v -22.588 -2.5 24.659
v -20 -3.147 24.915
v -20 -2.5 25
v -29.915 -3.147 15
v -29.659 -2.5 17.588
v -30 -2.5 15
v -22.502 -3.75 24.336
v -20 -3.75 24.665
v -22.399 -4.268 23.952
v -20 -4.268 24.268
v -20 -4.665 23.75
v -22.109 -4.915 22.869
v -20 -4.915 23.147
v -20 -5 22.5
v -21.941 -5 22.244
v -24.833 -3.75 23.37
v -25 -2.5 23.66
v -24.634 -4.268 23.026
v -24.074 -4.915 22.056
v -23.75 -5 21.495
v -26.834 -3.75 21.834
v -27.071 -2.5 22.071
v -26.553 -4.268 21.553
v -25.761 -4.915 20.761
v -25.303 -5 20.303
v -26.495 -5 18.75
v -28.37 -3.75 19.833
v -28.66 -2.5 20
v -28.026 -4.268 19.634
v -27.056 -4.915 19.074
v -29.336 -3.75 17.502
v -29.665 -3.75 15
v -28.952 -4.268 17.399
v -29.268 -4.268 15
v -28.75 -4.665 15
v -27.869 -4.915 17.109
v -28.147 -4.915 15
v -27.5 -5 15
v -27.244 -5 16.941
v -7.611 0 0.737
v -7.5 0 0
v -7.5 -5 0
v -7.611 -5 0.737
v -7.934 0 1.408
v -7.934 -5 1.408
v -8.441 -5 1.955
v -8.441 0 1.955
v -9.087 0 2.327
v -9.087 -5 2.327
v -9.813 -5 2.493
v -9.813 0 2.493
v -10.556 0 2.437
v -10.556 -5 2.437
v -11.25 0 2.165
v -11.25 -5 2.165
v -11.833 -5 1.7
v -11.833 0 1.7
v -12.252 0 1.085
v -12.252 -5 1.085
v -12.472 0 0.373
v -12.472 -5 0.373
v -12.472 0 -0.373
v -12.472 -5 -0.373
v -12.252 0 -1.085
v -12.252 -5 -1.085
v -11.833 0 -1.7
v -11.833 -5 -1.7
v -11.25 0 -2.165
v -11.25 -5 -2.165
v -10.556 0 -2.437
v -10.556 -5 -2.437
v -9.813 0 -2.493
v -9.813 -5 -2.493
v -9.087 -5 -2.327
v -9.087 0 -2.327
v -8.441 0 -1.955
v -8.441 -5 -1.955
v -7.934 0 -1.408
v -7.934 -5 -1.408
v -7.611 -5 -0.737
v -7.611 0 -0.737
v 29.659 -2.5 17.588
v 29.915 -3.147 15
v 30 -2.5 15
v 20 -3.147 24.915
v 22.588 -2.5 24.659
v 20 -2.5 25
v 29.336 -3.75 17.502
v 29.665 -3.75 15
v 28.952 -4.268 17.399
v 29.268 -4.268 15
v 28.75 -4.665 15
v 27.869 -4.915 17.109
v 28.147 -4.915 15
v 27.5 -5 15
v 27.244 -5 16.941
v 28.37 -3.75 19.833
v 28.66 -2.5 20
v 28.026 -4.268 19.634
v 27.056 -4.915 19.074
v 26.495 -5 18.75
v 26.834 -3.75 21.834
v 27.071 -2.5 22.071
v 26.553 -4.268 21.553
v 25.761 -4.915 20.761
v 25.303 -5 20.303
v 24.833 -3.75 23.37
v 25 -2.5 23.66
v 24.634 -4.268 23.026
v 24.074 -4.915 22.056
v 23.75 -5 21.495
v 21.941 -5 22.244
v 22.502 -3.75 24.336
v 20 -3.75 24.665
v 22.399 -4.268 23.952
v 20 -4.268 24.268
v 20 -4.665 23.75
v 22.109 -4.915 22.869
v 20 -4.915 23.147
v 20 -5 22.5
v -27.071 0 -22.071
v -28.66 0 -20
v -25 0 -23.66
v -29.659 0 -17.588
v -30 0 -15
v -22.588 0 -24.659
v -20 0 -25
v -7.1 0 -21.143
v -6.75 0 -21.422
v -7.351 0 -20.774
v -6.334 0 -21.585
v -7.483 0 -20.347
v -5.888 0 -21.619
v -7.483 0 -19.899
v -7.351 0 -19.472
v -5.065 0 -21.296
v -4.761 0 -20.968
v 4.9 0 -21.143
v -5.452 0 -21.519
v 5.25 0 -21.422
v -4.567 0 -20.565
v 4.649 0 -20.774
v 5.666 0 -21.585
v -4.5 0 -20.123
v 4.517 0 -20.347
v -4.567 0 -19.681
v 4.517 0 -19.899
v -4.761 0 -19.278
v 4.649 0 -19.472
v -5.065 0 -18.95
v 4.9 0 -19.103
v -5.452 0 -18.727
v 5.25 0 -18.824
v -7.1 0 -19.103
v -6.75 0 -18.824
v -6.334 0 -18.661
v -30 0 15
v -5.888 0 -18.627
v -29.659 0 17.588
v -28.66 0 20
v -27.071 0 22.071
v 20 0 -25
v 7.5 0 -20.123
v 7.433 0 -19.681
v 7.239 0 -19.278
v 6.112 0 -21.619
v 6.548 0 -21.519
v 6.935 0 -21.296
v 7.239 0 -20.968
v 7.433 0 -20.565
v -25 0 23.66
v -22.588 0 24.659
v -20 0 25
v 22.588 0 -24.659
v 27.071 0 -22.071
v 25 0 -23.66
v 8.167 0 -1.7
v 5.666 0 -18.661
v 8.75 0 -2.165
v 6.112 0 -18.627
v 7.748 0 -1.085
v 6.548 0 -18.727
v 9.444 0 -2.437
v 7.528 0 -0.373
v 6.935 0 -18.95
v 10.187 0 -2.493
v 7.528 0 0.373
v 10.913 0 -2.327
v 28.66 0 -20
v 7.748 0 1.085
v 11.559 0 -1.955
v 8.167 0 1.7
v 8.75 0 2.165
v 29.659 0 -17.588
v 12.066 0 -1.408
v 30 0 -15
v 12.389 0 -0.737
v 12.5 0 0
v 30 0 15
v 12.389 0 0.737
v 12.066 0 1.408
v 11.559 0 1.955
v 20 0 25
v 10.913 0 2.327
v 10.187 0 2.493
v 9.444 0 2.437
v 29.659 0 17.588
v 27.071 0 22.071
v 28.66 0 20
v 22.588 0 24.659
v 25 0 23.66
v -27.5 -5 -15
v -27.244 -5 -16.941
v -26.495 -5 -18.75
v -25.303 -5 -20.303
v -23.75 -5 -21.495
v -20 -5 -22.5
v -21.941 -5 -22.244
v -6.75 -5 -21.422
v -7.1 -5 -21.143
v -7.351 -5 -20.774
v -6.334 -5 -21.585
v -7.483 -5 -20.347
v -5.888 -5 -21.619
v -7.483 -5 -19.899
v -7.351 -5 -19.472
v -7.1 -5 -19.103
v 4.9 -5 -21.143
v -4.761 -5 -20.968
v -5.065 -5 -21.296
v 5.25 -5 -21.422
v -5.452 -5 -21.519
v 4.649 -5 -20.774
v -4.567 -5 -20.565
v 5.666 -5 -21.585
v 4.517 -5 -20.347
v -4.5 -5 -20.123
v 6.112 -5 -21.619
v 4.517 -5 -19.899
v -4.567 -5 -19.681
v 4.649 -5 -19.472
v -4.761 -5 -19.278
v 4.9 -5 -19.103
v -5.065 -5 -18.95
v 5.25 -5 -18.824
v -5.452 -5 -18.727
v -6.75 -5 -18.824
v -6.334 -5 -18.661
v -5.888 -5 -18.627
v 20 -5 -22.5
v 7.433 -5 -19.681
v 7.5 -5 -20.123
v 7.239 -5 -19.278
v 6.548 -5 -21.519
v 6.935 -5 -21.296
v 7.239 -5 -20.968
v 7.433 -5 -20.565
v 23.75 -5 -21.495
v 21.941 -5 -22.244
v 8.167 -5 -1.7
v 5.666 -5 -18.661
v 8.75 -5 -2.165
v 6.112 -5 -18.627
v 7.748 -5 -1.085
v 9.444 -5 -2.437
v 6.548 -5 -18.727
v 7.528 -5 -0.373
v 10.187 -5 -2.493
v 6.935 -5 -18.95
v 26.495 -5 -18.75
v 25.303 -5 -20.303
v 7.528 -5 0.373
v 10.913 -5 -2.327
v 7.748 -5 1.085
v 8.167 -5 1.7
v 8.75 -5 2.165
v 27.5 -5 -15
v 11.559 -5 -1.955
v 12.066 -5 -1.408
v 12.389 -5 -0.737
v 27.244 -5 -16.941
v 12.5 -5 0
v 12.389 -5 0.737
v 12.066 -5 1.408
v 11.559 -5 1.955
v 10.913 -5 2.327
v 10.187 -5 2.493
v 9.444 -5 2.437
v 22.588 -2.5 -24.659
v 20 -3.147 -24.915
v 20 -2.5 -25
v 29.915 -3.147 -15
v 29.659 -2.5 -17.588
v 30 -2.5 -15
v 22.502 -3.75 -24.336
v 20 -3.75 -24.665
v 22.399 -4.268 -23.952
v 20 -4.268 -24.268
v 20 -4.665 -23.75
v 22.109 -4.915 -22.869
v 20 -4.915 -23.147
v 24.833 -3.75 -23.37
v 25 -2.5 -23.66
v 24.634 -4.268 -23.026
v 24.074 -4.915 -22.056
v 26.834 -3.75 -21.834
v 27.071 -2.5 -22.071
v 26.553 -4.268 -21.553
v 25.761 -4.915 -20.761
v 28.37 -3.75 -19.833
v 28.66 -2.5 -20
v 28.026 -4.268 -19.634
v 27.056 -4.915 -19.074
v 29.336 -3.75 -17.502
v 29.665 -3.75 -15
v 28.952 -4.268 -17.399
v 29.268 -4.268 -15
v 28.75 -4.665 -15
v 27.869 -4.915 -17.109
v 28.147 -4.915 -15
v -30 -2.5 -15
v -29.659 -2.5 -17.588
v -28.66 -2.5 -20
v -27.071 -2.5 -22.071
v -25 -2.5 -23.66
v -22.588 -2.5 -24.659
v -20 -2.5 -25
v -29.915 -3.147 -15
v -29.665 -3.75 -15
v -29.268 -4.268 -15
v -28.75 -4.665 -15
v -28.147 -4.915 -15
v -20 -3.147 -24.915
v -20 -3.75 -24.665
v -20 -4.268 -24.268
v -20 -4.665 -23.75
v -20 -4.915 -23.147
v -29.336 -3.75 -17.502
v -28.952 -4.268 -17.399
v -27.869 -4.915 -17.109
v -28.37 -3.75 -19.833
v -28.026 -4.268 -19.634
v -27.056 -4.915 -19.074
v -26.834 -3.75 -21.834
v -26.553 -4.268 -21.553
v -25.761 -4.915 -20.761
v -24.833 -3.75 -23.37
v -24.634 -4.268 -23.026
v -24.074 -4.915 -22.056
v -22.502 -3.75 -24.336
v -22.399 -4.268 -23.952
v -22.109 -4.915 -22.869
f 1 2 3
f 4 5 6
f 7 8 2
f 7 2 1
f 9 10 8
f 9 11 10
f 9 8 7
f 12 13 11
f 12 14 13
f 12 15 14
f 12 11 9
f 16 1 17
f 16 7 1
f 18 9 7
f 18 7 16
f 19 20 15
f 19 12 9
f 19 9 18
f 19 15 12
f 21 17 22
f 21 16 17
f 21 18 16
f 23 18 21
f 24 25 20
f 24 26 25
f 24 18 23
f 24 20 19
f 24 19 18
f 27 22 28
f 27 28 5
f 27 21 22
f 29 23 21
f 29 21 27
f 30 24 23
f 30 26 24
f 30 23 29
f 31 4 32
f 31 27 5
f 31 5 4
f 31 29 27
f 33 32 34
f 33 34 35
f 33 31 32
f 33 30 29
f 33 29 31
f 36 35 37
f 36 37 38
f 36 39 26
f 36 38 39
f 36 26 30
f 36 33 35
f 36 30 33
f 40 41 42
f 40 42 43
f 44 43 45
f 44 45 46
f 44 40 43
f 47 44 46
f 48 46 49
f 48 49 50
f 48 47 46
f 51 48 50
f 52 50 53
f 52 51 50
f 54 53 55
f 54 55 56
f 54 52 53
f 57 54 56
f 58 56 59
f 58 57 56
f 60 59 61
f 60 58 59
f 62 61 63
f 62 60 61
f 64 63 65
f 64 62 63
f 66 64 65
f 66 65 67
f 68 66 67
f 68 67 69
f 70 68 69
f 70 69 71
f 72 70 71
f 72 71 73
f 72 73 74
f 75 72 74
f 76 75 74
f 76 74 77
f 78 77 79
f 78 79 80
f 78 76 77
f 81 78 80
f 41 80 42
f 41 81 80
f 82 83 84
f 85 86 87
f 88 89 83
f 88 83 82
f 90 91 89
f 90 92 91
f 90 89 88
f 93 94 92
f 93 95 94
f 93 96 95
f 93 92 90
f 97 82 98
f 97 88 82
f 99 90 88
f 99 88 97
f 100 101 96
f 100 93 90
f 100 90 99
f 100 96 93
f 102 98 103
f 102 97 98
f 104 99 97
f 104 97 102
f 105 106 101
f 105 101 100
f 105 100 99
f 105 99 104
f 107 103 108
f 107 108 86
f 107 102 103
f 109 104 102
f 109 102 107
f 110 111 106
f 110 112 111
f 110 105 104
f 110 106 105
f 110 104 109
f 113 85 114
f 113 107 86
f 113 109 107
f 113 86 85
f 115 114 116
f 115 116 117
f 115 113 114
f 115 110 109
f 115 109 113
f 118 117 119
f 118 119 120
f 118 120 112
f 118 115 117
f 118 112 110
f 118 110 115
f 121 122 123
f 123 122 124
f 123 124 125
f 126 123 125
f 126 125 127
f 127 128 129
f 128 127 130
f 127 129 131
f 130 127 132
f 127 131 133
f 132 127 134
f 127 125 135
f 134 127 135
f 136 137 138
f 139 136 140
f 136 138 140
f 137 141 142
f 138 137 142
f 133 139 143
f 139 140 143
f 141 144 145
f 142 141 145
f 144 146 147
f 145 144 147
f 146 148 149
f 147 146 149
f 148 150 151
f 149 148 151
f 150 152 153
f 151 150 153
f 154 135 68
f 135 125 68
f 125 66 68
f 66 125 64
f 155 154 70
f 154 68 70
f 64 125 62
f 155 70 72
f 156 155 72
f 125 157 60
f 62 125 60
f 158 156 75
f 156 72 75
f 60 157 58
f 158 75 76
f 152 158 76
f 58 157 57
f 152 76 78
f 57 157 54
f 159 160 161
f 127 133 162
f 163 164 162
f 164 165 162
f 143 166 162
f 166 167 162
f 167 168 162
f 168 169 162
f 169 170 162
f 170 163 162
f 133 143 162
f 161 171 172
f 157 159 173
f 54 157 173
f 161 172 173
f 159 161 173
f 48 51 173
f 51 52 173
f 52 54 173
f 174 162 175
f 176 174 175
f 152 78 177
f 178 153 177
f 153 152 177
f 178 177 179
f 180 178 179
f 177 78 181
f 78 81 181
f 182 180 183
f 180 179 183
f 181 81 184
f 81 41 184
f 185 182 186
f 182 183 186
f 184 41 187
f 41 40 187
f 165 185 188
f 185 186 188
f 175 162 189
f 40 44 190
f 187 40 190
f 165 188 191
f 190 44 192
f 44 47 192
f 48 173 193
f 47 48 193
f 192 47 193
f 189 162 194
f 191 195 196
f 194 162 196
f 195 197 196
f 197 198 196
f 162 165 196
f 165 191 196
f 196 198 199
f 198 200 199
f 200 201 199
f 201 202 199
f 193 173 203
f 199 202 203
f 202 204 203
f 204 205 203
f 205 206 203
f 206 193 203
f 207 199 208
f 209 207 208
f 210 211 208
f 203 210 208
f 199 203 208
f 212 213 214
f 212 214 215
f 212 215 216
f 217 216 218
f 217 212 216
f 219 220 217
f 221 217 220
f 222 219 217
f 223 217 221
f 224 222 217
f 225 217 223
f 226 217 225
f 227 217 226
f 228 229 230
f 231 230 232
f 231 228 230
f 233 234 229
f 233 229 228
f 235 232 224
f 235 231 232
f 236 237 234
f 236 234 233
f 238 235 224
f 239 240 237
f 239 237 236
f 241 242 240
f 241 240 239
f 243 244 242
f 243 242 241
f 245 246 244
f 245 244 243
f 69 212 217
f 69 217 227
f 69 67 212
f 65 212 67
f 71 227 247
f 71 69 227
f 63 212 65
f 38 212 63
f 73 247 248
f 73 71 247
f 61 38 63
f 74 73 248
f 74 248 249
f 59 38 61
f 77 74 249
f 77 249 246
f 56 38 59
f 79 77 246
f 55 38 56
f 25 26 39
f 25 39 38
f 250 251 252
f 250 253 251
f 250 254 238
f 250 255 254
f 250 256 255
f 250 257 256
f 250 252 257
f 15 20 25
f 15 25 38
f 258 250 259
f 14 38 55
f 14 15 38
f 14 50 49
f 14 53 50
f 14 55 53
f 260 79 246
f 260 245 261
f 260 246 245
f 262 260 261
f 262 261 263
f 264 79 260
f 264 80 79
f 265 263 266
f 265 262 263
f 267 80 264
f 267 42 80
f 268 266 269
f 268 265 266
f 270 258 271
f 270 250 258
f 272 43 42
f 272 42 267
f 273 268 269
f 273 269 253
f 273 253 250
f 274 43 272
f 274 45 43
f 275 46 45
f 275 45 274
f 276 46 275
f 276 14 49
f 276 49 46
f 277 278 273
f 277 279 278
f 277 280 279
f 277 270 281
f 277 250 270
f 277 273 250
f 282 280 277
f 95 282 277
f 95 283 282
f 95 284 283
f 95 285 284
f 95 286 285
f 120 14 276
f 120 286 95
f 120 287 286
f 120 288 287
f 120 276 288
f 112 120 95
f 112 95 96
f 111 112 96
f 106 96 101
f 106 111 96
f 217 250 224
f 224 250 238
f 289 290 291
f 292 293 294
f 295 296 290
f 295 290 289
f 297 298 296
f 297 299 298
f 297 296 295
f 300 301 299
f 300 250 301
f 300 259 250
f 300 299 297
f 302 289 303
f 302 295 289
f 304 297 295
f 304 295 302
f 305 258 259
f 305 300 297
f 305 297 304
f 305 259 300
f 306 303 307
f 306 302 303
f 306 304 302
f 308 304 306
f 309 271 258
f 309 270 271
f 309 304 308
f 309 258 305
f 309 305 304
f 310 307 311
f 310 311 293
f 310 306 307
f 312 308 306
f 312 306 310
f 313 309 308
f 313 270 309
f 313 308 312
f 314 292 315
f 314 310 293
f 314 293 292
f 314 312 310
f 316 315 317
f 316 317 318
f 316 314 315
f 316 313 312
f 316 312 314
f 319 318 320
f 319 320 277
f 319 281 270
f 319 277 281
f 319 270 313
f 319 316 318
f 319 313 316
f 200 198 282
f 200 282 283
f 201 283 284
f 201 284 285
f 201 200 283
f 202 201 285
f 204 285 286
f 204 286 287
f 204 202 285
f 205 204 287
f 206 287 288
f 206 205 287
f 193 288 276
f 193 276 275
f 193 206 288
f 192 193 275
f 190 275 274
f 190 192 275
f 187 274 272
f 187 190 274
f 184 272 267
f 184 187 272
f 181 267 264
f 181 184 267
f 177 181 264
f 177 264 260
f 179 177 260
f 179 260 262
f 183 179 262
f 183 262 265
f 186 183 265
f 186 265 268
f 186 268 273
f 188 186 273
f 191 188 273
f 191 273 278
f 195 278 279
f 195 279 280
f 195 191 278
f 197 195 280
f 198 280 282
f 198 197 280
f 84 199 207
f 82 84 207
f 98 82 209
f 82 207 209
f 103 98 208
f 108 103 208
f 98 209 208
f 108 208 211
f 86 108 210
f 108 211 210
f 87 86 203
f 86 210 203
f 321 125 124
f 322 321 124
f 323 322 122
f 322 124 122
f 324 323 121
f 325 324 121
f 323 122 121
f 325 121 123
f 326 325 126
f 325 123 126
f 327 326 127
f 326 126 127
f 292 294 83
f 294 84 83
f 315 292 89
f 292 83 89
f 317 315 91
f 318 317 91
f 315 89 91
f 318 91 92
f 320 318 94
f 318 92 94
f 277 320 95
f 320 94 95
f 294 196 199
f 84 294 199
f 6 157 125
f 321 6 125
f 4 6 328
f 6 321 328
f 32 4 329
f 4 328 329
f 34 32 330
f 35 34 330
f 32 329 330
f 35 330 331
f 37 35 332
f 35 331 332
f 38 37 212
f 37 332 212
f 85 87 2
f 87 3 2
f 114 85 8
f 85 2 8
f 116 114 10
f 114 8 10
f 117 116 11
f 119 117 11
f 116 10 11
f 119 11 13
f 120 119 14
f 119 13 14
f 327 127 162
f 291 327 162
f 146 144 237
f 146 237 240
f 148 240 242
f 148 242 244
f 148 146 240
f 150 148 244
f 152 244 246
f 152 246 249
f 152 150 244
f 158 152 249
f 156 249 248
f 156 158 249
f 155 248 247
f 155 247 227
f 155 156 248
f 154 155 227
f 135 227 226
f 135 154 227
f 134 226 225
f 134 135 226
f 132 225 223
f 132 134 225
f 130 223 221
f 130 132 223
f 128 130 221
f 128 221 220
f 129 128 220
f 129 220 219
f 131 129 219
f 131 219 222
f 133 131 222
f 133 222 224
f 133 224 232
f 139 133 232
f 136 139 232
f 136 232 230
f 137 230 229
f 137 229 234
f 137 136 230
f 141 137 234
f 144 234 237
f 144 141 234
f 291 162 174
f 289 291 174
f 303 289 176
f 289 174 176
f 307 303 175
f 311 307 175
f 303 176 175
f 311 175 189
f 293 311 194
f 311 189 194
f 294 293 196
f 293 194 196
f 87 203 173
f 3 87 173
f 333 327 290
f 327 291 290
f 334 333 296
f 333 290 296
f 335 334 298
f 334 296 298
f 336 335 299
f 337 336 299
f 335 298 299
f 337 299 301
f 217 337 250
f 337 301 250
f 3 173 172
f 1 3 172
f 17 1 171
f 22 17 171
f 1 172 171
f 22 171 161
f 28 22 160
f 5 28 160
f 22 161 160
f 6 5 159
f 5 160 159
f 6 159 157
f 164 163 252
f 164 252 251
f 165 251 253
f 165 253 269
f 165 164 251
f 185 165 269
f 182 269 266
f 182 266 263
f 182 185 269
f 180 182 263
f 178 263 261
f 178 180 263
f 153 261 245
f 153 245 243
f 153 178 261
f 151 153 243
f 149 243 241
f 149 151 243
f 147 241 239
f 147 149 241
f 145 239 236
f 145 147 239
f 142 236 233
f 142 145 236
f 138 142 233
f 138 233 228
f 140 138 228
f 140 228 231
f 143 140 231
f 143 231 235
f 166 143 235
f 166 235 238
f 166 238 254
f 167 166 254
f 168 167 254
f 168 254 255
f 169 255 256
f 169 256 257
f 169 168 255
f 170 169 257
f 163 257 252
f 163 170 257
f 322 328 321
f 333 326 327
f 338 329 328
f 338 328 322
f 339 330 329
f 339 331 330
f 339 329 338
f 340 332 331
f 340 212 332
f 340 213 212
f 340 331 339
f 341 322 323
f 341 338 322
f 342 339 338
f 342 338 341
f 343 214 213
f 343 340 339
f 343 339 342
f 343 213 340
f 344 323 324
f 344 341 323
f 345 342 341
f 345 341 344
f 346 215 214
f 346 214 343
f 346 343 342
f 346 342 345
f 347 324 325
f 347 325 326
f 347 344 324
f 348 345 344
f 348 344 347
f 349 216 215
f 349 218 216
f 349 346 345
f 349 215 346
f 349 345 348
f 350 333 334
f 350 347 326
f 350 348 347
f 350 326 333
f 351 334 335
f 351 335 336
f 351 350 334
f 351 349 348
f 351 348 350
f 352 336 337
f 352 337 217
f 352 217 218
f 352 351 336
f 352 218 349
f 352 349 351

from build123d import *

# Parameters (mm, degrees)
F0_R     = 1.5
F0_R_2   = 2.5
F1_DEPTH = 5
F2_R     = 2.5


with BuildPart() as f1:
    # F0 (on Front) → F1 (new body)
    with BuildSketch(Plane.XZ):
        with BuildLine():
            Line((-20, -25), (20, -25))
            ThreePointArc((20, -25), (27.071068, -22.071068), (30, -15))
            Line((30, -15), (30, 15))
            ThreePointArc((30, 15), (27.071068, 22.071068), (20, 25))
            Line((20, 25), (-20, 25))
            ThreePointArc((-20, 25), (-27.071068, 22.071068), (-30, 15))
            Line((-30, 15), (-30, -15))
            ThreePointArc((-30, -15), (-27.071068, -22.071068), (-20, -25))
        make_face()
        with Locations((-6, -20.123001)):
            Circle(F0_R, mode=Mode.SUBTRACT)
        with Locations((6, -20.123001)):
            Circle(F0_R, mode=Mode.SUBTRACT)
        with Locations((-10, 0)):
            Circle(F0_R_2, mode=Mode.SUBTRACT)
        with Locations((10, 0)):
            Circle(F0_R_2, mode=Mode.SUBTRACT)
    extrude(amount=F1_DEPTH)

    # F2
    f2_edges = [f1.edges().sort_by_distance(p)[0] for p in [
        (-30, -5, 0),
        (30, -5, 0),
        (0, -5, 25),
        (0, -5, -25),
        (-27.071068, -5, -22.071068),
        (27.071068, -5, -22.071068),
        (-27.071068, -5, 22.071068),
        (27.071068, -5, 22.071068),
    ]]
    fillet(f2_edges, radius=F2_R)


solid = f1.part
